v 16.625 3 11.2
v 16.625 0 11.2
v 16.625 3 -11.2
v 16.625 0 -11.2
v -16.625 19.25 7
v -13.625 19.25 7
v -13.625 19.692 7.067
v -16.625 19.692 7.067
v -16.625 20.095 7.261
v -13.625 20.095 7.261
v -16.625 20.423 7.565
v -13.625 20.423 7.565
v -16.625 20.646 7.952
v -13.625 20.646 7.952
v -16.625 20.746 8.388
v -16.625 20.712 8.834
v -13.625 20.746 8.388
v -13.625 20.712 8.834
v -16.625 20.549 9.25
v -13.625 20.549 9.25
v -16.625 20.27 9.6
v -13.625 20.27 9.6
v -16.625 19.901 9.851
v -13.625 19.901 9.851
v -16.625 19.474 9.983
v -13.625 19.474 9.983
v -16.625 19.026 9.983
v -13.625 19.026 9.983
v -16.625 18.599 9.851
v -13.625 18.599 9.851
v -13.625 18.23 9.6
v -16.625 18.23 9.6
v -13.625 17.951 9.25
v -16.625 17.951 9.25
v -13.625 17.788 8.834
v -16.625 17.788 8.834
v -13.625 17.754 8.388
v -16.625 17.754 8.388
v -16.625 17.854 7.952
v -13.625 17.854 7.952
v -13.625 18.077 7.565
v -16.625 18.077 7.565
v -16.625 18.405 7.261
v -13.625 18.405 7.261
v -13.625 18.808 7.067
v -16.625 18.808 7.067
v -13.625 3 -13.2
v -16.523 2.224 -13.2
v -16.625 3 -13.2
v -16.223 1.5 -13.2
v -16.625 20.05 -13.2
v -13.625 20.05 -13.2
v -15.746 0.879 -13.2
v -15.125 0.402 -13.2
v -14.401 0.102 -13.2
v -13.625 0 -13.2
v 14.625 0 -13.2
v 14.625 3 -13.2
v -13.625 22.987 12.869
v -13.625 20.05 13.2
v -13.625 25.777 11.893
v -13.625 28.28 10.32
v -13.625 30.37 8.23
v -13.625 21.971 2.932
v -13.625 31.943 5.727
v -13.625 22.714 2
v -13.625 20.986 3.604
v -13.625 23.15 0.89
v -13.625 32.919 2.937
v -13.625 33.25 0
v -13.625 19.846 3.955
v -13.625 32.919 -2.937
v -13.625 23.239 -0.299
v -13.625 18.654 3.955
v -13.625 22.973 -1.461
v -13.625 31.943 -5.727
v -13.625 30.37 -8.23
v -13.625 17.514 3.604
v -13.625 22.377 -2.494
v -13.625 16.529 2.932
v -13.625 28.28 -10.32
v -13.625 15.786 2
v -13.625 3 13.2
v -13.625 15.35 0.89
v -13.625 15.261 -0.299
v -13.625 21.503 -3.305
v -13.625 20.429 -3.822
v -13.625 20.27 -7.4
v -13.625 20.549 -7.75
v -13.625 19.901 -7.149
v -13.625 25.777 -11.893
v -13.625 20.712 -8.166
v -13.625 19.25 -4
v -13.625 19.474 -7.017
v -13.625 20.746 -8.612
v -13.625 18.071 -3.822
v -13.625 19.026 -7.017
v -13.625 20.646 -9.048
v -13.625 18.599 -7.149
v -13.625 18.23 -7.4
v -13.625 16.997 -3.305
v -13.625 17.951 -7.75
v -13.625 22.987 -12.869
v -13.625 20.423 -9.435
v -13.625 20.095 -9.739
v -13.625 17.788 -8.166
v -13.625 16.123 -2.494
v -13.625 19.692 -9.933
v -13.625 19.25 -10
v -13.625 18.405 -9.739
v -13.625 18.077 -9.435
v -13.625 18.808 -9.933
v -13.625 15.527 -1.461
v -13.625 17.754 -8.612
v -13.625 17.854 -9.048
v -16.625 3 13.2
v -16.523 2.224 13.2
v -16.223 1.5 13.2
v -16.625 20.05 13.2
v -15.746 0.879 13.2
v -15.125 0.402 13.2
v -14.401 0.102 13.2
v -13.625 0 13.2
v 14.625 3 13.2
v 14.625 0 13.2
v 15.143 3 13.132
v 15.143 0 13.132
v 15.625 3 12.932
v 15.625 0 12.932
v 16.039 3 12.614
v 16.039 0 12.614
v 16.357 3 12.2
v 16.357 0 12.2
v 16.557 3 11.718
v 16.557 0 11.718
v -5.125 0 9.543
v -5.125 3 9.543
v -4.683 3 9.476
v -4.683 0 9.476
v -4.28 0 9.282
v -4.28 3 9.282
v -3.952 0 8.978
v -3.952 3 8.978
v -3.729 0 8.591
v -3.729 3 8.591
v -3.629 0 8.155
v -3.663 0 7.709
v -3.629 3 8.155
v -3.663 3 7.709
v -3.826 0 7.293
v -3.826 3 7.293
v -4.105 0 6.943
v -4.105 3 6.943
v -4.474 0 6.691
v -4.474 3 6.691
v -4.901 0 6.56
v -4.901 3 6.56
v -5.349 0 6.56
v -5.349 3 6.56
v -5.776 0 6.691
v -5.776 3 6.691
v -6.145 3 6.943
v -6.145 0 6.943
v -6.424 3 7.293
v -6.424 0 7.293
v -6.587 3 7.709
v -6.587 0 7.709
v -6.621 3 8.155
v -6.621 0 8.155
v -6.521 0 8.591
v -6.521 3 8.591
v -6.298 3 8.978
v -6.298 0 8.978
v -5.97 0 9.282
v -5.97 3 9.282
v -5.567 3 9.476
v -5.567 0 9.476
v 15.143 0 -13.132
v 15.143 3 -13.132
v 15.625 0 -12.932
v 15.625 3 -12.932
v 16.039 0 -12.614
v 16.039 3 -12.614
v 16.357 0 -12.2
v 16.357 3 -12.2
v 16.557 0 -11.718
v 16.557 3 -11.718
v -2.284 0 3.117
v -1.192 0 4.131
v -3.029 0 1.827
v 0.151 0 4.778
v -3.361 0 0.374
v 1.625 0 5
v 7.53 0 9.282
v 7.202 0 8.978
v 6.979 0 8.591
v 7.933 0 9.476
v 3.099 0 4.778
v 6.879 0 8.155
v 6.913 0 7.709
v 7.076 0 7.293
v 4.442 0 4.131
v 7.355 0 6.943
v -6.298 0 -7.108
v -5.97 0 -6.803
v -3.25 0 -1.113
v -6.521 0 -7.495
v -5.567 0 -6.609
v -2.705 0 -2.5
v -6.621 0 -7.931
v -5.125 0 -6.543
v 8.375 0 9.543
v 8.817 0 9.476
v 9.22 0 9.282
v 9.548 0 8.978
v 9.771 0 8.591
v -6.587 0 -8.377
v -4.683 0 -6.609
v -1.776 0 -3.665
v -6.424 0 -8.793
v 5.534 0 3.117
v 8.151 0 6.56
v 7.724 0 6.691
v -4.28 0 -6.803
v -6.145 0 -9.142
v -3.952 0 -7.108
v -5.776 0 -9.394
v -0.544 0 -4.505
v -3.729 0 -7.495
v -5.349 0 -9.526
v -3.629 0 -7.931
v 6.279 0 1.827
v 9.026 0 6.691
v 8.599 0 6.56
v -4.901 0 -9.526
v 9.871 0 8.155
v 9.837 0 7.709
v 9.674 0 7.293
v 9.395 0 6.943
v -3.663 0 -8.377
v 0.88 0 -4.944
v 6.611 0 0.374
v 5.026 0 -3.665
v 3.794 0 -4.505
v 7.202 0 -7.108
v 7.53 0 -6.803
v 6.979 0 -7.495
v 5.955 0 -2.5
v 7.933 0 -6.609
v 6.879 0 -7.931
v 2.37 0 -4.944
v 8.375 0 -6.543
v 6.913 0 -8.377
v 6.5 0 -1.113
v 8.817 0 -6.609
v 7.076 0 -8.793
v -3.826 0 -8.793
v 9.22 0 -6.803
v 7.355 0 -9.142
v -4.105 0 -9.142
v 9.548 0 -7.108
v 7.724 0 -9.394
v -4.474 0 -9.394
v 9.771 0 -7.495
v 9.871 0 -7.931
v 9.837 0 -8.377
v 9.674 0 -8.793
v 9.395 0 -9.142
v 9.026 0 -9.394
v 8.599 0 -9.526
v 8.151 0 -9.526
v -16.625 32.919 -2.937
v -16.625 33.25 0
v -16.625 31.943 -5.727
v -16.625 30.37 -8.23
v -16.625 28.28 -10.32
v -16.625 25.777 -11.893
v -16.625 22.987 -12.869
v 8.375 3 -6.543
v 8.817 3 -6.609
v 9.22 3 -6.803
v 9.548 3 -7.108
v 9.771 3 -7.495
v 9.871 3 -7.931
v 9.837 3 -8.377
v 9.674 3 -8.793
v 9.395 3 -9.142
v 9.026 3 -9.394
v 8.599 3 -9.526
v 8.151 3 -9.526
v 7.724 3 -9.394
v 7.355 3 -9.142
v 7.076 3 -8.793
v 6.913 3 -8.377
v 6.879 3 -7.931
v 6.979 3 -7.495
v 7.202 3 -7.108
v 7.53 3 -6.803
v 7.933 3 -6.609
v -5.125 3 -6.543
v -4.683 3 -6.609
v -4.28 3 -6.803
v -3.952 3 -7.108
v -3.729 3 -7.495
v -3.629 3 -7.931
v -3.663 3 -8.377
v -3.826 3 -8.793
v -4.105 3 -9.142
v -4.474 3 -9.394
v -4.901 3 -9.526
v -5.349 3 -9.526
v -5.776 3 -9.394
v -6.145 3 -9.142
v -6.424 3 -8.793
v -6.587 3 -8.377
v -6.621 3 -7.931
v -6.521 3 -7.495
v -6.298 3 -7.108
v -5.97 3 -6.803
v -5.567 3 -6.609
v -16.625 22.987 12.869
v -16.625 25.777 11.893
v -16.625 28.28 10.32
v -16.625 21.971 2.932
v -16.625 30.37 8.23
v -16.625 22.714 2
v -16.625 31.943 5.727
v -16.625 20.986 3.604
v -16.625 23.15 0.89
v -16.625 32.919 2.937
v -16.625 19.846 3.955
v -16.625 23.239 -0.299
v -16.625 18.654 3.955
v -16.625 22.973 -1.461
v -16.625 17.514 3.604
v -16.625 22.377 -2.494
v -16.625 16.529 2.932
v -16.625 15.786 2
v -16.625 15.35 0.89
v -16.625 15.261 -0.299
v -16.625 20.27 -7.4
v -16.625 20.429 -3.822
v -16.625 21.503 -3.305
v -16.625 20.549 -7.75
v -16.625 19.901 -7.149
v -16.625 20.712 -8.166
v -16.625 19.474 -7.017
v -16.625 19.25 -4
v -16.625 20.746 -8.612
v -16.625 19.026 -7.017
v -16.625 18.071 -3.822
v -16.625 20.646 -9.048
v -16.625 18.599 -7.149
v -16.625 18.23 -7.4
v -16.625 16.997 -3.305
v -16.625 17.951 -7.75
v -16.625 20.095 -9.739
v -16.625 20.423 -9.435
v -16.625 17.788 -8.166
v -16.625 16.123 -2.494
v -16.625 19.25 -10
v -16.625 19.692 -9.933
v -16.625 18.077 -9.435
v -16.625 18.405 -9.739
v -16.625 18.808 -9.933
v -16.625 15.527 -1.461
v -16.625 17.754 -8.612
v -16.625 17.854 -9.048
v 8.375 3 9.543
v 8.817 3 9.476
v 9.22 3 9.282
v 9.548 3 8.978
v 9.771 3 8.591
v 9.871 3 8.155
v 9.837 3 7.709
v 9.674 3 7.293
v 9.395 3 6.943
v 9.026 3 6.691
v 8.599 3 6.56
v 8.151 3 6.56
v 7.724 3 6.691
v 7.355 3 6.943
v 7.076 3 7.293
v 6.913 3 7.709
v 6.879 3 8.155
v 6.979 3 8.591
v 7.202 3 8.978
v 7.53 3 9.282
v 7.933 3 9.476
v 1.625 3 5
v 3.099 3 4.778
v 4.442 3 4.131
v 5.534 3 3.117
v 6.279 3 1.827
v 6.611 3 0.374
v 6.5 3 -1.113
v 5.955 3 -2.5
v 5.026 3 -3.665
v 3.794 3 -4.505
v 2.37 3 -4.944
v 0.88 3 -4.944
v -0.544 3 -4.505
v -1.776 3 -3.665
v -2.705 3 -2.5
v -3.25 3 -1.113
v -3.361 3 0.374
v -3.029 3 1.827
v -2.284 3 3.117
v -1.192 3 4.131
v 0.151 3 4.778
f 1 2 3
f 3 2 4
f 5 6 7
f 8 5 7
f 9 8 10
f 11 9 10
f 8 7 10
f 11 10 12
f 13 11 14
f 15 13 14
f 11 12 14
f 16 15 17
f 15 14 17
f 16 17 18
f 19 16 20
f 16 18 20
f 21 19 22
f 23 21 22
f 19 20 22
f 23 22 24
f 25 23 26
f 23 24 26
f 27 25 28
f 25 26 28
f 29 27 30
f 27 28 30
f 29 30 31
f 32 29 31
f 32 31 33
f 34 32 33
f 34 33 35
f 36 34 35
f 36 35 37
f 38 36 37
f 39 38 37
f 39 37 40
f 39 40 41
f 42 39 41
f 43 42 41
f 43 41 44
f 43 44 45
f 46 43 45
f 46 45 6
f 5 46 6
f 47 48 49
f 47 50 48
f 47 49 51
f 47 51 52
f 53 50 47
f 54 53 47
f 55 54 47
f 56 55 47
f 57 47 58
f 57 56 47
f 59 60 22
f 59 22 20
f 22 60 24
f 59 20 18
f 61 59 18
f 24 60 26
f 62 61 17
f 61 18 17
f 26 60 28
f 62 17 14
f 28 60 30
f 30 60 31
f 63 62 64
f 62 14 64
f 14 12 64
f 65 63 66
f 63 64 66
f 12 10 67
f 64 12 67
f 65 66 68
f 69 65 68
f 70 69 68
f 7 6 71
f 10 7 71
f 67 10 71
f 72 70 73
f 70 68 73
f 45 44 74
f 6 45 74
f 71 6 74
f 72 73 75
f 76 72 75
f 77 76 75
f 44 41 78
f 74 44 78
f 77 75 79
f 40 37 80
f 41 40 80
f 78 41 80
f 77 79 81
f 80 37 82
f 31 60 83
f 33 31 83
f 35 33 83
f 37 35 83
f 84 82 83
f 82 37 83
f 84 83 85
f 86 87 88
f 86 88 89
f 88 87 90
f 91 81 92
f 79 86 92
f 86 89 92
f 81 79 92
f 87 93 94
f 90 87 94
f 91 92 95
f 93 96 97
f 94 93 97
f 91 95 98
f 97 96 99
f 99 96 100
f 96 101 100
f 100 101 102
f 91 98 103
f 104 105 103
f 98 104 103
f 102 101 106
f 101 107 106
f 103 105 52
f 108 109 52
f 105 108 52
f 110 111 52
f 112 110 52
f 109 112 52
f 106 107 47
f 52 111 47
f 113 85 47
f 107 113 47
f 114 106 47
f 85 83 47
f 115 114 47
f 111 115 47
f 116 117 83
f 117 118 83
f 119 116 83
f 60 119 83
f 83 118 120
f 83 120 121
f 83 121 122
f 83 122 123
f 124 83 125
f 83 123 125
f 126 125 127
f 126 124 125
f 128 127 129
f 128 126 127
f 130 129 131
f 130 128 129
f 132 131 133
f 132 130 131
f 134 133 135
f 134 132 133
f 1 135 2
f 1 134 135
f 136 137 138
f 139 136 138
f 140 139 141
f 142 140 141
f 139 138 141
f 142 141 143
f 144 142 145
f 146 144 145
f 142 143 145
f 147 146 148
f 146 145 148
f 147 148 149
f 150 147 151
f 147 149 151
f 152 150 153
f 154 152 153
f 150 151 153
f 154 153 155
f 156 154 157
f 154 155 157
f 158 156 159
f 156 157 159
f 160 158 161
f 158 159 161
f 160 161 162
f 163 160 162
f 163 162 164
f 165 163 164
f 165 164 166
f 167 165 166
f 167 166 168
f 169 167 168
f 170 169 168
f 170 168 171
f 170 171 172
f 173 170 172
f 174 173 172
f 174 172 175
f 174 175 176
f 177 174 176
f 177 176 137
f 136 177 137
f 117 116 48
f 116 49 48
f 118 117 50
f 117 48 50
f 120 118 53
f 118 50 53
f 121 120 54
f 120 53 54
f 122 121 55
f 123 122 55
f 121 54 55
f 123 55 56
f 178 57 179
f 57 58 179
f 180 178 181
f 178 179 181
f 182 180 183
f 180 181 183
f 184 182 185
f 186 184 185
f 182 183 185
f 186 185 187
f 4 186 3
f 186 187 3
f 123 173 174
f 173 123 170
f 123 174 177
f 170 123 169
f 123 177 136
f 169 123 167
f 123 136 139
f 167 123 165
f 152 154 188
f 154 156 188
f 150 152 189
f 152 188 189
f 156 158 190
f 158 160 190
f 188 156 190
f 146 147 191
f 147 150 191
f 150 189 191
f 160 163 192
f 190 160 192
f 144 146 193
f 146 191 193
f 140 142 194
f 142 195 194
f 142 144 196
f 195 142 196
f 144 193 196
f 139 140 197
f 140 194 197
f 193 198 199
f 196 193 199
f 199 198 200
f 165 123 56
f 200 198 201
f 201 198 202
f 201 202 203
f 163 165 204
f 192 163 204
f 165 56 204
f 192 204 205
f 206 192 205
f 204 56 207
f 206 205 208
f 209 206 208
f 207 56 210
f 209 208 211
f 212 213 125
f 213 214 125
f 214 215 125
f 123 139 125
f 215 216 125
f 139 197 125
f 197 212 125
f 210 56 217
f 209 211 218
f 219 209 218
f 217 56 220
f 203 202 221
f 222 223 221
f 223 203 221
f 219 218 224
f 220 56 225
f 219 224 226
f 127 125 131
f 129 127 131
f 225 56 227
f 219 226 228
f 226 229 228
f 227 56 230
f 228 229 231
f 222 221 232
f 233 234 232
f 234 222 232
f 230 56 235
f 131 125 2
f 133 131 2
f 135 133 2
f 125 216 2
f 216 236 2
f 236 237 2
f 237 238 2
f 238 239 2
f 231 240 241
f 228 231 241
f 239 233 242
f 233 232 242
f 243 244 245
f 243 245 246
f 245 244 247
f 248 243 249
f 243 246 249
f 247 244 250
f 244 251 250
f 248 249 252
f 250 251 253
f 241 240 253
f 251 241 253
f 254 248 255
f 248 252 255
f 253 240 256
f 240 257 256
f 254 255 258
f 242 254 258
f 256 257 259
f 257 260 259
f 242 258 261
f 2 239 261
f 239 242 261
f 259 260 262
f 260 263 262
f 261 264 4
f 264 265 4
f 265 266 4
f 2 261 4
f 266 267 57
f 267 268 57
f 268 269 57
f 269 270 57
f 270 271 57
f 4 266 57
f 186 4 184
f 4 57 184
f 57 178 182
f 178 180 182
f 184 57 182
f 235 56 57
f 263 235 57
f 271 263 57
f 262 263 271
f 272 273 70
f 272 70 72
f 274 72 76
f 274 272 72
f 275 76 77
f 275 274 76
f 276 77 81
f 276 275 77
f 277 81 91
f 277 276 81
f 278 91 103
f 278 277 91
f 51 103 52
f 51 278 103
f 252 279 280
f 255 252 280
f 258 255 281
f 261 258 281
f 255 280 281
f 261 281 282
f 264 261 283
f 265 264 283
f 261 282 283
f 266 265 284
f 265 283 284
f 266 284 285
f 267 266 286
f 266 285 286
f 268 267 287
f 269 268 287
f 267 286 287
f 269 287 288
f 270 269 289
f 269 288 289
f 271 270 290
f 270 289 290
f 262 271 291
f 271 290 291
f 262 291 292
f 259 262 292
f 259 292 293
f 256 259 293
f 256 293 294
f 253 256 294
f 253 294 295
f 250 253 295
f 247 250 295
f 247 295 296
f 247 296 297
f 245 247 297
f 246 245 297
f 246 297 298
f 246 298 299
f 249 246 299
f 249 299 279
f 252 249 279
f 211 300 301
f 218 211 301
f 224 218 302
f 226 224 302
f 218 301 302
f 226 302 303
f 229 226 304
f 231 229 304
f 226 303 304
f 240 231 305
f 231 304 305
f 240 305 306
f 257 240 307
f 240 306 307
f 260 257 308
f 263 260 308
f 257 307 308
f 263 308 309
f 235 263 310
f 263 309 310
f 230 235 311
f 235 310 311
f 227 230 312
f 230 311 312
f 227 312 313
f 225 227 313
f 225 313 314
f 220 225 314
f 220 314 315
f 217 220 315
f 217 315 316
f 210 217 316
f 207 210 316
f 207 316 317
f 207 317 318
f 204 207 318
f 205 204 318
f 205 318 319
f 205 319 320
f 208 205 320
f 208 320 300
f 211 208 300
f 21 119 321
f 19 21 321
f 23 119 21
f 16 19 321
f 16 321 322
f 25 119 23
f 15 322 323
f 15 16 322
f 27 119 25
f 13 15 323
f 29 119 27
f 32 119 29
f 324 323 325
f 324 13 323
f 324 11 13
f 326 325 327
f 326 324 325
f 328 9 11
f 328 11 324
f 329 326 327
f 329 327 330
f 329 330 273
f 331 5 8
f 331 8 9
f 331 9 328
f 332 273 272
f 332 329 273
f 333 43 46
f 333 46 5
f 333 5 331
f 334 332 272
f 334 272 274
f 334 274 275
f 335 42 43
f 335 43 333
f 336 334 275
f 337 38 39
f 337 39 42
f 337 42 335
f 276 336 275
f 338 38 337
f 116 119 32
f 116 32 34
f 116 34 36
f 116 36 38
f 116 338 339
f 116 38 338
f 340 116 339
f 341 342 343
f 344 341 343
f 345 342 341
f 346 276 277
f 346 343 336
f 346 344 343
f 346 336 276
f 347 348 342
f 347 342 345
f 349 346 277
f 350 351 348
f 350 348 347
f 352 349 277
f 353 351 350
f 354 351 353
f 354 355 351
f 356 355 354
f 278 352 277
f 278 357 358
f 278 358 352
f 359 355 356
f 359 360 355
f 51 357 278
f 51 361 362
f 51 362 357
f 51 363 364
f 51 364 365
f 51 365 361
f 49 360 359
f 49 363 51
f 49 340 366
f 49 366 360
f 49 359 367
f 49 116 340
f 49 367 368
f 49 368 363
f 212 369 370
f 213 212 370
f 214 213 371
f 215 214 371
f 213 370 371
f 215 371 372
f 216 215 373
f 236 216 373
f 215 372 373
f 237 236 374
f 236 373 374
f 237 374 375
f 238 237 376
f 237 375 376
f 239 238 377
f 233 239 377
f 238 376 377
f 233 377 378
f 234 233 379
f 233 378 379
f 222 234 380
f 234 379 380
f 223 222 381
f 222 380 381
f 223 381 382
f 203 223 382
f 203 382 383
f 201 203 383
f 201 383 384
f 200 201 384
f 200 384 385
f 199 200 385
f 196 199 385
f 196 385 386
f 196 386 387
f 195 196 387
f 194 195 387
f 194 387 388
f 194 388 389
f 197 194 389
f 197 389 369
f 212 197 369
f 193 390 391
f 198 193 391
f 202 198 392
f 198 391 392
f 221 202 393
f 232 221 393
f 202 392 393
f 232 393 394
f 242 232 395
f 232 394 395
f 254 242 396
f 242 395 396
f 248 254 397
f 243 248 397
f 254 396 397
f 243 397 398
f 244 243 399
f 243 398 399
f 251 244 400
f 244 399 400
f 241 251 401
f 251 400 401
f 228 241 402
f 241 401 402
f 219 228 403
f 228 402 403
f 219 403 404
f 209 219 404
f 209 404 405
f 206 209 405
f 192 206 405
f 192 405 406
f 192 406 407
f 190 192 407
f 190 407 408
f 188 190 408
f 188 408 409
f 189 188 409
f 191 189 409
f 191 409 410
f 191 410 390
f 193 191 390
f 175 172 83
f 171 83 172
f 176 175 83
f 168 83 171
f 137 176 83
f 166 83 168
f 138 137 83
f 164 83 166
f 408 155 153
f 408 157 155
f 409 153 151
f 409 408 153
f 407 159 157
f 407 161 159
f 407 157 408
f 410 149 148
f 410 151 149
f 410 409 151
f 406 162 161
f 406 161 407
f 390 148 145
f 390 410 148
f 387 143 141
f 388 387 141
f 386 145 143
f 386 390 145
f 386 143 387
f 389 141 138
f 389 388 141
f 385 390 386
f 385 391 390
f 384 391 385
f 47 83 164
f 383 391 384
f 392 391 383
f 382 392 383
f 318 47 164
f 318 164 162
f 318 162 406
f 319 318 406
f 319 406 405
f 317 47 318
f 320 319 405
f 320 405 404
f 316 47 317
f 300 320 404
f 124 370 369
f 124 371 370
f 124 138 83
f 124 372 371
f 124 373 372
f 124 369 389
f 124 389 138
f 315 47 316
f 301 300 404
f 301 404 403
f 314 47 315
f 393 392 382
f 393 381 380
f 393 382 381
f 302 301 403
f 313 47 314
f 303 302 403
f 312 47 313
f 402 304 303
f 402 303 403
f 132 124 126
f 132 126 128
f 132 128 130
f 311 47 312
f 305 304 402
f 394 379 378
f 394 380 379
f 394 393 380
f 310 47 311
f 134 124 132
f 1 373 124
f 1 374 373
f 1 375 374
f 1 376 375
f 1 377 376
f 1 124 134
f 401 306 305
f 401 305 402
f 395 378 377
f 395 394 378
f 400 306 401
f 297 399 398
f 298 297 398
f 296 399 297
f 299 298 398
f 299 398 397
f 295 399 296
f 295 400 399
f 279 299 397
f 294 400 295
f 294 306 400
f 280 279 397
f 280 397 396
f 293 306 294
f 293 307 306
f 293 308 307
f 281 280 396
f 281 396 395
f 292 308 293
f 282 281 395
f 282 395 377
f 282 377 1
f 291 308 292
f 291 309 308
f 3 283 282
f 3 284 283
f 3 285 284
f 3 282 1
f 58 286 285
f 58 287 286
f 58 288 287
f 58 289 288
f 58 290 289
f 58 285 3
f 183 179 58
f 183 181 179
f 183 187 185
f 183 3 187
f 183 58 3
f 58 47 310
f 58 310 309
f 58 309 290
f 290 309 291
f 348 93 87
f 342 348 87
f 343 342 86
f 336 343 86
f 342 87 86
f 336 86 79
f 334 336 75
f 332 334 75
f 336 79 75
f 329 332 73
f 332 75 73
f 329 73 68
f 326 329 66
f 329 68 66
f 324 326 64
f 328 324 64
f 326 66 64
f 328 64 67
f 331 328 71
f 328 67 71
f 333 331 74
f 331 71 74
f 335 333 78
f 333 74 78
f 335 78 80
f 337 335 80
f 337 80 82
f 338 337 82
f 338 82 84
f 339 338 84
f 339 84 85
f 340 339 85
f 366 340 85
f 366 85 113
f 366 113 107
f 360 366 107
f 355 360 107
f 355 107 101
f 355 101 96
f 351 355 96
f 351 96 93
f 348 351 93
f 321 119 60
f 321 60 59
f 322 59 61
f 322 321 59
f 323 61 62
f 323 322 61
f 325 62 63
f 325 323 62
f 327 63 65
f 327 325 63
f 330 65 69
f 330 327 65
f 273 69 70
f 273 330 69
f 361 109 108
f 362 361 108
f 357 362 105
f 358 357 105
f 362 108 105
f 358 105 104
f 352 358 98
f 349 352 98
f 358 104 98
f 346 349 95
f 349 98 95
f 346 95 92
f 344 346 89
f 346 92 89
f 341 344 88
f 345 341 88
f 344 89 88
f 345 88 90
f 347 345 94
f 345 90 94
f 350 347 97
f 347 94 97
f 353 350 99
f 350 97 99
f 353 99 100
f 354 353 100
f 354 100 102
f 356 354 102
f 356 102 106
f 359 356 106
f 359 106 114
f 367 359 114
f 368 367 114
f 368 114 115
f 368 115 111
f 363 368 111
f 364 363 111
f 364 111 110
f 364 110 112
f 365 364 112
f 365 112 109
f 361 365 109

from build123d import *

# Parameters (mm, degrees)
SKETCH1_W               = 30.25
SKETCH1_H               = 26.4
BOSS_EXTRUDE1_DEPTH     = 3
SKETCH1_3_W             = 3
SKETCH1_3_H             = 26.4
BOSS_EXTRUDE2_DEPTH     = 33.25
FILLET1_R               = 3
CUT_EXTRUDE1_DEPTH      = 47.849386335
CUT_EXTRUDE1_DEPTH_BACK = 47.849386335
FILLET2_R               = 2
SKETCH3_R               = 4
SKETCH3_R_2             = 1.5
CUT_EXTRUDE2_DEPTH      = 47.849386335
CUT_EXTRUDE3_REACH      = 38.955
SKETCH4_R               = 5
SKETCH4_R_2             = 1.5


with BuildPart() as part:
    # Sketch1 → Boss-Extrude1 (new body)
    with BuildSketch(Plane(origin=(0, 0, 0), x_dir=(1, 0, 0), z_dir=(0, 1, 0))):
        with Locations((1.5, 0)):
            Rectangle(SKETCH1_W, SKETCH1_H)
    extrude(amount=BOSS_EXTRUDE1_DEPTH)

    # Sketch1<3> → Boss-Extrude2 (add)
    with BuildSketch(Plane(origin=(0, 0, 0), x_dir=(1, 0, 0), z_dir=(0, 1, 0))):
        with Locations((-15.125, 0)):
            Rectangle(SKETCH1_3_W, SKETCH1_3_H)
    extrude(amount=BOSS_EXTRUDE2_DEPTH)

    # Fillet1
    fillet1_edges = [part.edges().sort_by_distance(p)[0] for p in [
        (-16.625, 0, 0),
    ]]
    fillet(fillet1_edges, radius=FILLET1_R)

    # Sketch2 → Cut-Extrude1 (cut, two sides: drawn at the far end of the back side and taken through both)
    with BuildSketch(Plane(origin=(-13.625, 0, 0), x_dir=(0, 0, -1), z_dir=(1, 0, 0)).offset(-CUT_EXTRUDE1_DEPTH_BACK)):
        with BuildLine():
            Line((-13.2, 33.25), (-13.2, 20.05))
            ThreePointArc((-13.2, 20.05), (-9.333809512, 29.383809512), (0, 33.25))
            Line((0, 33.25), (-13.2, 33.25))
        make_face()
        with BuildLine():
            ThreePointArc((0, 33.25), (9.333809512, 29.383809512), (13.2, 20.05))
            Line((13.2, 20.05), (13.2, 33.25))
            Line((13.2, 33.25), (0, 33.25))
        make_face()
    extrude(amount=CUT_EXTRUDE1_DEPTH + CUT_EXTRUDE1_DEPTH_BACK, mode=Mode.SUBTRACT)

    # Fillet2
    fillet2_edges = [part.edges().sort_by_distance(p)[0] for p in [
        (16.625, 1.5, 13.2),
        (16.625, 1.5, -13.2),
    ]]
    fillet(fillet2_edges, radius=FILLET2_R)

    # Sketch3 → Cut-Extrude2 (cut, through all)
    with BuildSketch(Plane(origin=(-13.625, 0, 0), x_dir=(0, 0, -1), z_dir=(1, 0, 0))):
        with Locations((0, 19.25)):
            Circle(SKETCH3_R)
        with Locations((8.5, 19.25)):
            Circle(SKETCH3_R_2)
        with Locations((-8.5, 19.25)):
            Circle(SKETCH3_R_2)
    extrude(amount=-CUT_EXTRUDE2_DEPTH, mode=Mode.SUBTRACT)

    # Sketch4 → Cut-Extrude3 (cut, up to next)
    with BuildSketch(Plane(origin=(0, 3, 0), x_dir=(1, 0, 0), z_dir=(0, 1, 0)), mode=Mode.PRIVATE) as cut_extrude3_sk1:
        with Locations(Location((1.625, 0, 0), (0, 0, 270))):
            Circle(SKETCH4_R)
    cut_extrude3_tool1 = extrude(cut_extrude3_sk1.sketch, amount=-CUT_EXTRUDE3_REACH, mode=Mode.PRIVATE) & part.part
    # Sketch4 → Cut-Extrude3 (cut, up to next)
    with BuildSketch(Plane(origin=(0, 3, 0), x_dir=(1, 0, 0), z_dir=(0, 1, 0)), mode=Mode.PRIVATE) as cut_extrude3_sk2:
        with Locations(Location((-5.125, -8.042853971, 0), (0, 0, 270))):
            Circle(SKETCH4_R_2)
    cut_extrude3_tool2 = extrude(cut_extrude3_sk2.sketch, amount=-CUT_EXTRUDE3_REACH, mode=Mode.PRIVATE) & part.part
    # Sketch4 → Cut-Extrude3 (cut, up to next)
    with BuildSketch(Plane(origin=(0, 3, 0), x_dir=(1, 0, 0), z_dir=(0, 1, 0)), mode=Mode.PRIVATE) as cut_extrude3_sk3:
        with Locations(Location((8.375, 8.042853971, 0), (0, 0, 270))):
            Circle(SKETCH4_R_2)
    cut_extrude3_tool3 = extrude(cut_extrude3_sk3.sketch, amount=-CUT_EXTRUDE3_REACH, mode=Mode.PRIVATE) & part.part
    # Sketch4 → Cut-Extrude3 (cut, up to next)
    with BuildSketch(Plane(origin=(0, 3, 0), x_dir=(1, 0, 0), z_dir=(0, 1, 0)), mode=Mode.PRIVATE) as cut_extrude3_sk4:
        with Locations(Location((8.375, -8.042853971, 0), (0, 0, 270))):
            Circle(SKETCH4_R_2)
    cut_extrude3_tool4 = extrude(cut_extrude3_sk4.sketch, amount=-CUT_EXTRUDE3_REACH, mode=Mode.PRIVATE) & part.part
    # Sketch4 → Cut-Extrude3 (cut, up to next)
    with BuildSketch(Plane(origin=(0, 3, 0), x_dir=(1, 0, 0), z_dir=(0, 1, 0)), mode=Mode.PRIVATE) as cut_extrude3_sk5:
        with Locations(Location((-5.125, 8.042853971, 0), (0, 0, 270))):
            Circle(SKETCH4_R_2)
    cut_extrude3_tool5 = extrude(cut_extrude3_sk5.sketch, amount=-CUT_EXTRUDE3_REACH, mode=Mode.PRIVATE) & part.part
    add(cut_extrude3_tool1.solids().sort_by_distance((1.625, 3, 0))[0], mode=Mode.SUBTRACT)
    add(cut_extrude3_tool2.solids().sort_by_distance((-5.125, 3, 8.042854))[0], mode=Mode.SUBTRACT)
    add(cut_extrude3_tool3.solids().sort_by_distance((8.375, 3, -8.042854))[0], mode=Mode.SUBTRACT)
    add(cut_extrude3_tool4.solids().sort_by_distance((8.375, 3, 8.042854))[0], mode=Mode.SUBTRACT)
    add(cut_extrude3_tool5.solids().sort_by_distance((-5.125, 3, -8.042854))[0], mode=Mode.SUBTRACT)


solid = part.part
